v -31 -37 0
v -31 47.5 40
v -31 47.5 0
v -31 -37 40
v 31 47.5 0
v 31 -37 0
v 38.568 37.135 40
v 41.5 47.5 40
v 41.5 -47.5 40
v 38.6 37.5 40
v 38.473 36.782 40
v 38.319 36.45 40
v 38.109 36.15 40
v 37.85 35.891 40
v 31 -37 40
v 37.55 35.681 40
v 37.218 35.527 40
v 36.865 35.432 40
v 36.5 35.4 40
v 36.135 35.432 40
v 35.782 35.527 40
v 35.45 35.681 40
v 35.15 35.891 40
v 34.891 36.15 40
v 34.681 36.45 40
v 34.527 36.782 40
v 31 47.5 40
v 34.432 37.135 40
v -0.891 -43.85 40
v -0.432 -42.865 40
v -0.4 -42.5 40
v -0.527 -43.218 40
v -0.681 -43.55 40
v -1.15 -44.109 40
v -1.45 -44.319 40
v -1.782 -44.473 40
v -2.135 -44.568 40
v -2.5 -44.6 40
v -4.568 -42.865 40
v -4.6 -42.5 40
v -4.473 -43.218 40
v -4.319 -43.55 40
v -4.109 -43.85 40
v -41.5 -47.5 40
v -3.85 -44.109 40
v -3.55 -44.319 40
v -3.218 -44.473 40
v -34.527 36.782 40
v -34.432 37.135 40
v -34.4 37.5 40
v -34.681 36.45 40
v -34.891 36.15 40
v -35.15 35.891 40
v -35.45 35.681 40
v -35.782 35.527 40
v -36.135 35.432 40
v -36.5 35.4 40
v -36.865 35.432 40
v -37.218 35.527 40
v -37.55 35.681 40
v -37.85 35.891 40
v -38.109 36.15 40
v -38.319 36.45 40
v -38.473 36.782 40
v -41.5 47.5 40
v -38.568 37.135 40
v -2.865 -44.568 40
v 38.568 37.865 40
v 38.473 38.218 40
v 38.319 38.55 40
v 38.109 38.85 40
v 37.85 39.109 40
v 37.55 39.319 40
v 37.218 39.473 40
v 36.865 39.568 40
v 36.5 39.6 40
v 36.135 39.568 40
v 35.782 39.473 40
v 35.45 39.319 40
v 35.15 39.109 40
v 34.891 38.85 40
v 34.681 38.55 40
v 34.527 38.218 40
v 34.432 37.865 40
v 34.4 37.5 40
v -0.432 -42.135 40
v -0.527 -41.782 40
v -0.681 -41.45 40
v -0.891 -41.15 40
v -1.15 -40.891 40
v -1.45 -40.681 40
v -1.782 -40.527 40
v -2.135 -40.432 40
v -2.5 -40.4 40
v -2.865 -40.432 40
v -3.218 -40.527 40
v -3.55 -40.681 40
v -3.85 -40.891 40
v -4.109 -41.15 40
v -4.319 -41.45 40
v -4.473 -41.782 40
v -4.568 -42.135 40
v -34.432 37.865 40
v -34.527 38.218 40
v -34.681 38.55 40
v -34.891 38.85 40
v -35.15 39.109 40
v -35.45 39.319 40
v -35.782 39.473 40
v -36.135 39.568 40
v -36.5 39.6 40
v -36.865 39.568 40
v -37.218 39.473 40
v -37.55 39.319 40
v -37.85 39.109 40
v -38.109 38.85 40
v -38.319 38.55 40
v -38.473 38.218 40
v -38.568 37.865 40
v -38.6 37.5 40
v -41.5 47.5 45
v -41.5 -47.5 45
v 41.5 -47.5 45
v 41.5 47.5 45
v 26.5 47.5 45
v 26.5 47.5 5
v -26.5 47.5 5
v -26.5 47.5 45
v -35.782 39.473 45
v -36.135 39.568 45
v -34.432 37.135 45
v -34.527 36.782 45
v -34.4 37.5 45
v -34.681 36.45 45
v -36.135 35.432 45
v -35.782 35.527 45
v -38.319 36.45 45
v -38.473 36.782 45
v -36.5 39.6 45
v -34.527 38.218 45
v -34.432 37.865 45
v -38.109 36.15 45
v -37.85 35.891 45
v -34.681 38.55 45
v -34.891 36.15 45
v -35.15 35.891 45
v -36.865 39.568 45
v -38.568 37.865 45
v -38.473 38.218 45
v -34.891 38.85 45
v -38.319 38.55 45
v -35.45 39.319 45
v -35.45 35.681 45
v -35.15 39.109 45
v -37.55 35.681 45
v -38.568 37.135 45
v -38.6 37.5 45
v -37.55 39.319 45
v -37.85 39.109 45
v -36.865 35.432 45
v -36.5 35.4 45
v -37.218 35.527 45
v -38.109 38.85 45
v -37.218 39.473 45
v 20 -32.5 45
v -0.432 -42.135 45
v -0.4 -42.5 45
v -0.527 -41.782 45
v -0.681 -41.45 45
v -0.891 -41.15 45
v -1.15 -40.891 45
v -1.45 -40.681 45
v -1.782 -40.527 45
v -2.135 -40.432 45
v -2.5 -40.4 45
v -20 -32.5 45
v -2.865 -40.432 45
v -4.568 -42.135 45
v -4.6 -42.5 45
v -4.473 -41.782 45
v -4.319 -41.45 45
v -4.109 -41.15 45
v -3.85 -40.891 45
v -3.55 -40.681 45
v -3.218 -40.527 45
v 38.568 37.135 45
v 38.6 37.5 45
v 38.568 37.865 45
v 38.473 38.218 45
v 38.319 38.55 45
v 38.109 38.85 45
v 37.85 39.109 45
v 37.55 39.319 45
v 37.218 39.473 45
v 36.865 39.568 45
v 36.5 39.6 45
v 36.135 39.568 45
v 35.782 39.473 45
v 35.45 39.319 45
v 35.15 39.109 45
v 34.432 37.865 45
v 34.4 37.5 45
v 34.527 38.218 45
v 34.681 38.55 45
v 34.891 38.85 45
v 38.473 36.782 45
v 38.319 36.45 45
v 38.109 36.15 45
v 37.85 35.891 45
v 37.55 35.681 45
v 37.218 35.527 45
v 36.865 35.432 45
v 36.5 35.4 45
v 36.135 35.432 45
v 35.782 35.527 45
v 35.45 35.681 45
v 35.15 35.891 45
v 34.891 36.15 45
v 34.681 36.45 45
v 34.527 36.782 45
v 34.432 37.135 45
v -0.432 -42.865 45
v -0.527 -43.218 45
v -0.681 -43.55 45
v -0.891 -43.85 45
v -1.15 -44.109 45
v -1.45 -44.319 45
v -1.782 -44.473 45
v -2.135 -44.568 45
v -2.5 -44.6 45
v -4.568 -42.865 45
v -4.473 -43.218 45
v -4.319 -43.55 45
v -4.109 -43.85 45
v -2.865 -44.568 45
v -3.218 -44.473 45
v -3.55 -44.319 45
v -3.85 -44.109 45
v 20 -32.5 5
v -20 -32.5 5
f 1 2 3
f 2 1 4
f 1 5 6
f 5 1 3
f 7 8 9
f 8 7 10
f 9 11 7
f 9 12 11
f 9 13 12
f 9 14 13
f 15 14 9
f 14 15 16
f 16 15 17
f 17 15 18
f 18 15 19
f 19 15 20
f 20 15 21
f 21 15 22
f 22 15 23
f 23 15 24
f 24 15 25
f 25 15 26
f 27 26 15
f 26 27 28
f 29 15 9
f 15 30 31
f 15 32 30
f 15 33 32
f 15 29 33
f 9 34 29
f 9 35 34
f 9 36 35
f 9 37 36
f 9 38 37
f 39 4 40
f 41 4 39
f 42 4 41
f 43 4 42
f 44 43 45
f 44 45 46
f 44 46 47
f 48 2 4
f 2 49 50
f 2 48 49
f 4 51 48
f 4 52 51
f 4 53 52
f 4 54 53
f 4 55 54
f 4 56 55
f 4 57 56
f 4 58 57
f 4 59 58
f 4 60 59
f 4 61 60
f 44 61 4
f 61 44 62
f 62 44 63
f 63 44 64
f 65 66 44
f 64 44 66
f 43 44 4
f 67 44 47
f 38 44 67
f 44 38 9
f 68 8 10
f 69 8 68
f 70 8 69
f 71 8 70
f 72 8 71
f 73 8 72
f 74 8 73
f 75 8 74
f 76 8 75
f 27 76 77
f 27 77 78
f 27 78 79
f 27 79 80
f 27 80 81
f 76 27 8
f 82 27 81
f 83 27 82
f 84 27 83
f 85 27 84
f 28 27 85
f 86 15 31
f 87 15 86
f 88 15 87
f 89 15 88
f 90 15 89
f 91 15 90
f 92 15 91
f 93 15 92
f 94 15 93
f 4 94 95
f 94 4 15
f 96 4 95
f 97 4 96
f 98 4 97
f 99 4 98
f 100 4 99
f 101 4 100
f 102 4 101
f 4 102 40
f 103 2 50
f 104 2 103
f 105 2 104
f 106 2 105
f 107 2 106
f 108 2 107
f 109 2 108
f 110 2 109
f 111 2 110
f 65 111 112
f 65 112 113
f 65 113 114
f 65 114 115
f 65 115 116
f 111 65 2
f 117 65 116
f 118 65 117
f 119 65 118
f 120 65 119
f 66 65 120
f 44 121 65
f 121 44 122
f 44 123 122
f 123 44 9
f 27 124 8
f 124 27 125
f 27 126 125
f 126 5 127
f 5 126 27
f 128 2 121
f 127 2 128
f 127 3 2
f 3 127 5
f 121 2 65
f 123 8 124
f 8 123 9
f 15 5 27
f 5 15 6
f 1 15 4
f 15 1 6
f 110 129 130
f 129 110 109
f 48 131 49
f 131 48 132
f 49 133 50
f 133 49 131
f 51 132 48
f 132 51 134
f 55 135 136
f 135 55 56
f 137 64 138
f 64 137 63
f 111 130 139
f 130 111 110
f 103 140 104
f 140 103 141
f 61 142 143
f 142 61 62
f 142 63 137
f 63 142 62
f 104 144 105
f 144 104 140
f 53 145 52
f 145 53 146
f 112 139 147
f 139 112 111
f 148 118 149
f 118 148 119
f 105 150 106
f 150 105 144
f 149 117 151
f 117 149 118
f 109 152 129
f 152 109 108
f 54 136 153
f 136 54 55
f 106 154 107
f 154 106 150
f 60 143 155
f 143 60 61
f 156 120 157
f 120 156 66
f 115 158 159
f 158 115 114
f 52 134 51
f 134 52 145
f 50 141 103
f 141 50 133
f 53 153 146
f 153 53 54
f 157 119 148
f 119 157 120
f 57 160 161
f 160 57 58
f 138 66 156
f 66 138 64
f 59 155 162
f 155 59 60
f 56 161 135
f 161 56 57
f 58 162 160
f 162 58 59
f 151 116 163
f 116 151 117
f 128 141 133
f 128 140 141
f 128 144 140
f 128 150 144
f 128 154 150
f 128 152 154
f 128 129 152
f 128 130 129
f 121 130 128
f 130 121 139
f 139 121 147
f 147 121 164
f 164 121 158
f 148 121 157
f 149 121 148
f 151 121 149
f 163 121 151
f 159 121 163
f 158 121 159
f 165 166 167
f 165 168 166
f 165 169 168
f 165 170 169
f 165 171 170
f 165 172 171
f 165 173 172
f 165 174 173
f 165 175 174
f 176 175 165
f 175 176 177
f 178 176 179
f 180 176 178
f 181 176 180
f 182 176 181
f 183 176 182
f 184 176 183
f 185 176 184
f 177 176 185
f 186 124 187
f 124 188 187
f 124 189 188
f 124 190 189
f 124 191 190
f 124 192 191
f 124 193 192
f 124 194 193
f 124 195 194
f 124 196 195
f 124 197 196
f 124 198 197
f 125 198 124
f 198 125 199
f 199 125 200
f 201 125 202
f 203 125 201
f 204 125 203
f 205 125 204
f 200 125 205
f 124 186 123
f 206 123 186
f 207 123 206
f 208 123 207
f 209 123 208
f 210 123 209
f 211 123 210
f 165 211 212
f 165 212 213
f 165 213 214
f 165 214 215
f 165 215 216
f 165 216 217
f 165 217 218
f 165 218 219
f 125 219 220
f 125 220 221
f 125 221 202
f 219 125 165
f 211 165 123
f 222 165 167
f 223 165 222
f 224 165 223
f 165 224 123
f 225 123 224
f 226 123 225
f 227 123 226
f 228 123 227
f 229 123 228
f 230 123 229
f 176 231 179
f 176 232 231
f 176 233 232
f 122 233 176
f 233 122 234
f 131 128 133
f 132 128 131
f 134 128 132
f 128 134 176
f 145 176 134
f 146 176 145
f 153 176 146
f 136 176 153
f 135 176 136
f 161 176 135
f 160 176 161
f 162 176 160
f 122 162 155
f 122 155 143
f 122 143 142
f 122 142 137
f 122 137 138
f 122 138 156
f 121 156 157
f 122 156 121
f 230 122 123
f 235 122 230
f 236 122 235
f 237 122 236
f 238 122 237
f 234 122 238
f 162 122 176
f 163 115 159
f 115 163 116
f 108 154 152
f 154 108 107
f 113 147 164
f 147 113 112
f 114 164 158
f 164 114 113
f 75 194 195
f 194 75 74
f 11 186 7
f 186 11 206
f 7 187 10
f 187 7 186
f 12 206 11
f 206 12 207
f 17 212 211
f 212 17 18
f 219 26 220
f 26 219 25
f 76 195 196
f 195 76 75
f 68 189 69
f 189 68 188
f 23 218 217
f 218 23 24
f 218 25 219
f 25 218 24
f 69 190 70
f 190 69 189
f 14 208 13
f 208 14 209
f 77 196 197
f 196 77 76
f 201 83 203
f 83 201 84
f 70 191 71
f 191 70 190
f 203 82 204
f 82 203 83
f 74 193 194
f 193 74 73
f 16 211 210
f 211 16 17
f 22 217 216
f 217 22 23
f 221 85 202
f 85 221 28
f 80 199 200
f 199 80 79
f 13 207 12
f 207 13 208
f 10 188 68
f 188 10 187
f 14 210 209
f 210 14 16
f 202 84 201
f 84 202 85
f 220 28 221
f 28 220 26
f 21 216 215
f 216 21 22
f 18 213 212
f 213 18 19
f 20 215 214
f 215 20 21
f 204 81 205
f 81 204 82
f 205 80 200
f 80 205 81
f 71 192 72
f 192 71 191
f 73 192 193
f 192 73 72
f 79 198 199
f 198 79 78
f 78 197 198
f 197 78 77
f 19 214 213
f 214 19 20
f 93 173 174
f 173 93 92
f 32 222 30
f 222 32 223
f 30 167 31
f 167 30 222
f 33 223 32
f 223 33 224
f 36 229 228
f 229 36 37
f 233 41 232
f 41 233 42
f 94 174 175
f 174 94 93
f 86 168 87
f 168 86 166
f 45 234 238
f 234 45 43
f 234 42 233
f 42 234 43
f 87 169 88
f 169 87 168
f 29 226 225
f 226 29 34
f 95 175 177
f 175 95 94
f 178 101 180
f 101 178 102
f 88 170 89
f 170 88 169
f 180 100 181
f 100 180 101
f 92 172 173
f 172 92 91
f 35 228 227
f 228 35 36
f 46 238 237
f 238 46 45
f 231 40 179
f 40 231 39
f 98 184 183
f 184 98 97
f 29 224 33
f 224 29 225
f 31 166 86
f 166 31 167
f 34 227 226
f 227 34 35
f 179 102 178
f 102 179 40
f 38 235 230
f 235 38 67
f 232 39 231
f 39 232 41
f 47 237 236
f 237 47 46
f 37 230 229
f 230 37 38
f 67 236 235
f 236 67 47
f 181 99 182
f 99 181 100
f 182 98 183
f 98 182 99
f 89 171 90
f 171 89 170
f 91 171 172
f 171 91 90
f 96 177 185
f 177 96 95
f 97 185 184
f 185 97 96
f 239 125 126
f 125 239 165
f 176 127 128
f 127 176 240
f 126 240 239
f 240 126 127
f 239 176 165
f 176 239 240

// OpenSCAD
//
//  HamptonBayCeilingFanWallMount.scad
//
//  EvilTeach
//
//  1/10/2015
//



// Width of the controller at the top of the box
controlTopWidth = 53.0;

// Width of the controller at the bottom of the box
controlBotWidth = 40.0;

// Height of the box
controlDepth    = 80.0;

//Thickness of the controller
controlHeight   = 40.0;

// width of the part that the screw holes are in.
wallWidth       = 15.0;



// Make a cube big enough to hold the controller, and enough space for screwholes
cubeWidth  = wallWidth + controlTopWidth + wallWidth;
cubeDepth  = controlDepth + wallWidth;
cubeHeight =  controlHeight + 5;
module base_block()
{
    color("cyan")
        cube([cubeWidth, cubeDepth, cubeHeight]);
}


module trapezoid(width_base, width_top,height,thickness) 
{

  linear_extrude(height = thickness) 
      polygon(points=[[0,0],
                      [width_base,0],
                      [width_base-(width_base-width_top)/2,height],
                      [(width_base-width_top)/2,height]], 
              paths=[[0,1,2,3]]); 
  
}


// Make a controller bottom piece to subtract out of the cube.
module controller_insert()
{
    color("Yellow")
    translate([cubeWidth / 2.0 - controlTopWidth / 2.0, 0, 0])
            trapezoid(controlTopWidth, controlBotWidth, controlDepth, controlHeight);
}



// Make a model to cut away the extra material, and put in screw holes.
cutaway = wallWidth * .7;
module screw_holes()
{
    color("lime")
        translate([0, 0, 5])
        cube([cutaway, cubeDepth, cubeHeight - 5]);
    
    color("pink")
        translate([cubeWidth - cutaway, 0, 5])
            cube([cutaway, cubeDepth, cubeHeight - 5]);

    color("blue")
        translate([0, cubeDepth - cutaway, 5])
            cube([cubeWidth, cutaway, cubeHeight - 5]);

    color("red")
        translate([5, 10, 0])
            cylinder(r = 2.1, h = 5.0, $fn = 36);

    color("red")
        translate([cubeWidth - 5, 10, 0])
            cylinder(r = 2.1, h = 5.0, $fn = 36);

    color("red")
        translate([(cubeWidth - 5) / 2, cubeDepth - 5, 0])
            cylinder(r = 2.1, h = 5.0, $fn = 36);
}



module main()
{
    // Center it
    translate([-cubeWidth / 2, cubeDepth / 2, cubeHeight])
        // Minimize the need for support material
        rotate([180, 0, 0])
            difference()
            {
                base_block();
                controller_insert();
                screw_holes();
            }
}


main();
